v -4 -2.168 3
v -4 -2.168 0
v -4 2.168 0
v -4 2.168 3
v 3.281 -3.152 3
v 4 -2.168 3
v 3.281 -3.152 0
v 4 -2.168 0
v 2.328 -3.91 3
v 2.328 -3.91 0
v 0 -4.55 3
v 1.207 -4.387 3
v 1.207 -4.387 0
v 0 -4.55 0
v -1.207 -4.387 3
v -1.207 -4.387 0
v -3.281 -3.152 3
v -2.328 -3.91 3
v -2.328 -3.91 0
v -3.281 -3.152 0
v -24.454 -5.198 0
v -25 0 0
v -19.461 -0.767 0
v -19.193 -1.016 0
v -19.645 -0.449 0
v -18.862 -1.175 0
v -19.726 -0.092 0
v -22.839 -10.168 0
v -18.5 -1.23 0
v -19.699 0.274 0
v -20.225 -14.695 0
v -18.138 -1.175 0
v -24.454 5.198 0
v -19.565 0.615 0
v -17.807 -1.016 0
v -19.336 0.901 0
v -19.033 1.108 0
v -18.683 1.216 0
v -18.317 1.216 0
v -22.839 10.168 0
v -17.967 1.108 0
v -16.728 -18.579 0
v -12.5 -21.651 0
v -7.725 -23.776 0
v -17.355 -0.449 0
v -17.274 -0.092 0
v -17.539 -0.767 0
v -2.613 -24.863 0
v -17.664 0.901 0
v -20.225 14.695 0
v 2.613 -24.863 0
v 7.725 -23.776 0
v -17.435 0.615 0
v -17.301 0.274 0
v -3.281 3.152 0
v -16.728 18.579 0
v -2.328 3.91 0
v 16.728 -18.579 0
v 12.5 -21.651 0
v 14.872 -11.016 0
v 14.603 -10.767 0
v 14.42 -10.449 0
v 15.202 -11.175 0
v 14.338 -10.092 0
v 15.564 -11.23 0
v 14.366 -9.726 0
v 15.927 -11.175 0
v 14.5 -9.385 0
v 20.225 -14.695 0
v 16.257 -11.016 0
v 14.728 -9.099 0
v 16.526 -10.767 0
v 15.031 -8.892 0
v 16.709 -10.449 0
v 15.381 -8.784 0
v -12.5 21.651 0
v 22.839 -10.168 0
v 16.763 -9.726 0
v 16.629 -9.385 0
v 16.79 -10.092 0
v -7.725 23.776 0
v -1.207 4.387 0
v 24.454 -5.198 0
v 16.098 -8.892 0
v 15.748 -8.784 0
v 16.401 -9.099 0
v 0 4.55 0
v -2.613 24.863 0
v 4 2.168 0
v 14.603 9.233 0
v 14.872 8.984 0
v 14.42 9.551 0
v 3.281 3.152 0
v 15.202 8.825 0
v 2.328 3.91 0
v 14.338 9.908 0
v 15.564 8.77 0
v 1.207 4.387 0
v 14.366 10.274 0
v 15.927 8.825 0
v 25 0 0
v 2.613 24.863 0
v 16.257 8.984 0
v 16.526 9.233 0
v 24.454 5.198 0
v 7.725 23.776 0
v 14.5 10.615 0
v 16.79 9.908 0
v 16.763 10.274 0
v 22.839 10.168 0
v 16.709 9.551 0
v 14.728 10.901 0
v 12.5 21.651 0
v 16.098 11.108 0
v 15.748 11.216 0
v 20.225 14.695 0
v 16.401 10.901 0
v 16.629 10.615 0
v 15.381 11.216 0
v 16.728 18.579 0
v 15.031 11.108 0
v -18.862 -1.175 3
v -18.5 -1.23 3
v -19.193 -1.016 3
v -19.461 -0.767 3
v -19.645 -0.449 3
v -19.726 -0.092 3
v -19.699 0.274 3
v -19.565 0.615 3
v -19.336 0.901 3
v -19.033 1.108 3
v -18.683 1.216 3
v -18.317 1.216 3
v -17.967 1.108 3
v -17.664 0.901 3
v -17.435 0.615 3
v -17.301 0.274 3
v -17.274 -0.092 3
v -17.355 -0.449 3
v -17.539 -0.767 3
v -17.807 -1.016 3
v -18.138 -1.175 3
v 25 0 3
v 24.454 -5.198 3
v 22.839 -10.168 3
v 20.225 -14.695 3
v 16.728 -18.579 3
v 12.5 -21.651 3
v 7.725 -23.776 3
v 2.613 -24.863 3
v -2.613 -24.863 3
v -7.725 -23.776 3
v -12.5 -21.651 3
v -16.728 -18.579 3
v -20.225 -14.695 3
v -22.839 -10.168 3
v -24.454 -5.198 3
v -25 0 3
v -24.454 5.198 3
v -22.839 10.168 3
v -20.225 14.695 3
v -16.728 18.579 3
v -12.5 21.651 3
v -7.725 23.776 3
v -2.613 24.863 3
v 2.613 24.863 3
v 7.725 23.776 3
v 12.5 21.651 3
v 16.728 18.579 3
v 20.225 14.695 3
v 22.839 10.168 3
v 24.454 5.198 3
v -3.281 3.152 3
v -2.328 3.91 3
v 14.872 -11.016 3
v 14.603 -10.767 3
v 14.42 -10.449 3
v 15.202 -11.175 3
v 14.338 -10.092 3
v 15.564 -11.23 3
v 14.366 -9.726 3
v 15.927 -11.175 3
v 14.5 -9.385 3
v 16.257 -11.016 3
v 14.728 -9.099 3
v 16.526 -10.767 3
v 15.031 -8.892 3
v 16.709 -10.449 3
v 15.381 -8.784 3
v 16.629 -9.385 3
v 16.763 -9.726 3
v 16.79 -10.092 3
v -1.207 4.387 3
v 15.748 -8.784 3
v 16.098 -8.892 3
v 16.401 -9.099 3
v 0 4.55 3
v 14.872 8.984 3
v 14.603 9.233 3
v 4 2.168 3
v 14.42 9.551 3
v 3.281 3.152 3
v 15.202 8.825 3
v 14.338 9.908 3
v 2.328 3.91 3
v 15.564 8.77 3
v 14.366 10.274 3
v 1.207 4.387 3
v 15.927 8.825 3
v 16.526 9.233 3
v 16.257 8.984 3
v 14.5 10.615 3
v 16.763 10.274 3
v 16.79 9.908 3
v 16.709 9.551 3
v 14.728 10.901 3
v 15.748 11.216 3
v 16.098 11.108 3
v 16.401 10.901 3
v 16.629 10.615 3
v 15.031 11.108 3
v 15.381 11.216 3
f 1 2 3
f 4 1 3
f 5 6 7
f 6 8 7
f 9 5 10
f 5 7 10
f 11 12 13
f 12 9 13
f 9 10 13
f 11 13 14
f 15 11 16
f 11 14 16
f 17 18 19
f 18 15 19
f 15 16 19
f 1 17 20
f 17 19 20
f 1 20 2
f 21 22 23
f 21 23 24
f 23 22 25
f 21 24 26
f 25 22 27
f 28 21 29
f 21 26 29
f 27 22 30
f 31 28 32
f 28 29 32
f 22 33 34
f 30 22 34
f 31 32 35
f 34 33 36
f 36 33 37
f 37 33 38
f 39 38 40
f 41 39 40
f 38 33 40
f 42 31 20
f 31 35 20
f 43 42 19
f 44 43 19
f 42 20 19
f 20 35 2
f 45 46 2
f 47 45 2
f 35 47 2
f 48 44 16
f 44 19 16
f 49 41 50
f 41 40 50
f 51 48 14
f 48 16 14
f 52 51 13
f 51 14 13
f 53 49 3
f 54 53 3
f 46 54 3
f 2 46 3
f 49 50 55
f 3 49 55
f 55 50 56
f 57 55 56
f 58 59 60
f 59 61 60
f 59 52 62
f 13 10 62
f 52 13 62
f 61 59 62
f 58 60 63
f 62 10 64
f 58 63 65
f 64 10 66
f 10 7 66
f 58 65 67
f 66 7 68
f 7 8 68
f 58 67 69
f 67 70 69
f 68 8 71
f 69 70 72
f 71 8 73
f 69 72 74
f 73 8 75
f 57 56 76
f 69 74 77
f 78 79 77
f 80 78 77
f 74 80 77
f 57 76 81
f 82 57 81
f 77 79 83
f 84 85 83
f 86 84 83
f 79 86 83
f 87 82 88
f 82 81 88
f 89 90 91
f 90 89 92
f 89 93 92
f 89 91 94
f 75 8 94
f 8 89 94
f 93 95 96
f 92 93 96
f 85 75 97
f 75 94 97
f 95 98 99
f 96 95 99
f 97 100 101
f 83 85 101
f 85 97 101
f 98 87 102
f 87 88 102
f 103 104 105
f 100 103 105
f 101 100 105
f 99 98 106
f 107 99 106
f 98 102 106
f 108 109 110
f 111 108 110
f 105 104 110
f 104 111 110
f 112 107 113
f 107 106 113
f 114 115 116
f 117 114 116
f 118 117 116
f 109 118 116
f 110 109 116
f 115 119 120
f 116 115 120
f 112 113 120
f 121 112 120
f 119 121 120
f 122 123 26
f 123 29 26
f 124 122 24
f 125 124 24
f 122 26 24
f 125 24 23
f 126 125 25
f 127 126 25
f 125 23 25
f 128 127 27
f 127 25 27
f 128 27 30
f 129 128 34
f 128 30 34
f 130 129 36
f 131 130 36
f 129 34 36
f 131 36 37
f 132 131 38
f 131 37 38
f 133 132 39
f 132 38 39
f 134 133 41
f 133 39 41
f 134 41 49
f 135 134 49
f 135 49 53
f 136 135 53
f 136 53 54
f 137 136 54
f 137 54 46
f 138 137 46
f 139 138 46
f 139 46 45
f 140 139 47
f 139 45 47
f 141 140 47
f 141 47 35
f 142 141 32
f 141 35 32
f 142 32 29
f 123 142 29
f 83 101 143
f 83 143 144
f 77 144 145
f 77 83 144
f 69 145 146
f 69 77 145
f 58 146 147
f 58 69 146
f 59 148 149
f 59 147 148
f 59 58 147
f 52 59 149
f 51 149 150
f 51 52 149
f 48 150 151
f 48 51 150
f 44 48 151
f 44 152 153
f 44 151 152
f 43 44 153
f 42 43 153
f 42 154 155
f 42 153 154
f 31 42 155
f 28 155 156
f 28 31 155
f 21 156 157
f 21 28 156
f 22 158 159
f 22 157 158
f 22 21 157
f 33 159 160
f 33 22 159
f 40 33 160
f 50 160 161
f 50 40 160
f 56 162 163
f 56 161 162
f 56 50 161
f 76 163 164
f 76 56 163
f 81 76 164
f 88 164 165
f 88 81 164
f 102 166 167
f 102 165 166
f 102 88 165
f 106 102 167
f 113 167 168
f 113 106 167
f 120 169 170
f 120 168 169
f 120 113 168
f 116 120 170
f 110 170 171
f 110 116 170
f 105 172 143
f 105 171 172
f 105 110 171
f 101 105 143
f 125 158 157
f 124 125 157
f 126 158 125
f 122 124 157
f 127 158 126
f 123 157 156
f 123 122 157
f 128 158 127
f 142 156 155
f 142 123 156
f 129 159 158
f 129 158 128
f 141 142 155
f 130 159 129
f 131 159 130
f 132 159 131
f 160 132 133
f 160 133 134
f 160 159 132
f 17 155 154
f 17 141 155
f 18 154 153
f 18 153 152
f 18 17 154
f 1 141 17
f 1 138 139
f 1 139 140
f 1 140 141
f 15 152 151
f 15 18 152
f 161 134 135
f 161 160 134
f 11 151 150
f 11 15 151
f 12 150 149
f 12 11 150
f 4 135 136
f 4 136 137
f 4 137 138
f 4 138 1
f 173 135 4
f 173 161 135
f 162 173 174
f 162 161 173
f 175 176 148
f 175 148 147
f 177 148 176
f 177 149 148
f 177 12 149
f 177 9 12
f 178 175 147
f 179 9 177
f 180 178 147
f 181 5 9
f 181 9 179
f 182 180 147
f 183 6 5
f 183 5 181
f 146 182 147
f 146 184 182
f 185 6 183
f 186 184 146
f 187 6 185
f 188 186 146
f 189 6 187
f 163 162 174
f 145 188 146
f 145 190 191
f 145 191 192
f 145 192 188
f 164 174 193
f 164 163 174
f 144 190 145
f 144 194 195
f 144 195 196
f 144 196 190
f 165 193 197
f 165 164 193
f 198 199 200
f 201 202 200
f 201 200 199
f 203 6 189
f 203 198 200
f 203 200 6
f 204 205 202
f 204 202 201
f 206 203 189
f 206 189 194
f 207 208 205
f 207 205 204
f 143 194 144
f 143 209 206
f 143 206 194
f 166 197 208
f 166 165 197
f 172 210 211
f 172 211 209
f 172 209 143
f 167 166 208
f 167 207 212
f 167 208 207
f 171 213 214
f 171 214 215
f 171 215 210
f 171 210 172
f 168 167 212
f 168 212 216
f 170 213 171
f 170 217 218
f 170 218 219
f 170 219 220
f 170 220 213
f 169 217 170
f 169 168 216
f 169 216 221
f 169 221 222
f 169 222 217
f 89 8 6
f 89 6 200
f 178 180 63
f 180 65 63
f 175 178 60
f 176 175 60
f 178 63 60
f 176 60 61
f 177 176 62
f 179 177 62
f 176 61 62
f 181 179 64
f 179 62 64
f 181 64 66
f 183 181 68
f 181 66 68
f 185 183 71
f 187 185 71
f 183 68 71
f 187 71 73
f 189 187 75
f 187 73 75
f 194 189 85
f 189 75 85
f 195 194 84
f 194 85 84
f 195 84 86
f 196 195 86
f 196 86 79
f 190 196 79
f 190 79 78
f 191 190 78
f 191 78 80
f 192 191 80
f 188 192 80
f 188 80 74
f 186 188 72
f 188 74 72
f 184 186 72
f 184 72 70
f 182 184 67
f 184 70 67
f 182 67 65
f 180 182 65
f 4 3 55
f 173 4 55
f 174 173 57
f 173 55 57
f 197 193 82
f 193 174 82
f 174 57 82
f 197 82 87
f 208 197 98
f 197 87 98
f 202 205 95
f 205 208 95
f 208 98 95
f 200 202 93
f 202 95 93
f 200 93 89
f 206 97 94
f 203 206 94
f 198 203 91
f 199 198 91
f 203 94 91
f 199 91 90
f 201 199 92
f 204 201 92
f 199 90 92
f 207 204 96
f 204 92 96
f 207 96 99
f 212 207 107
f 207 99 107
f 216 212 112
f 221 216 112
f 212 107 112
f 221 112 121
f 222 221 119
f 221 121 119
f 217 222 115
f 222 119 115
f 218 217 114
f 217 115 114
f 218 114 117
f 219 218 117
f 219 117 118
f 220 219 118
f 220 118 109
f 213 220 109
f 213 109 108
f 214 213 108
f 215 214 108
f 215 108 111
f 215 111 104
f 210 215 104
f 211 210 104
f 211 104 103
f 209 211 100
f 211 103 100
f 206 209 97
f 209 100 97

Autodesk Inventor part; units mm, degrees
ref_plane "Plan YZ" through (0, 0, 0) normal (1, 0, 0) x (0, 1, 0)
ref_plane "Plan XZ" through (0, 0, 0) normal (0, 1, 0) x (-1, 0, 0)
ref_plane "Plan XY" through (0, 0, 0) normal (0, 0, 1) x (1, 0, 0)
sketch "Esquisse1" plane through (0, 0, 0) normal (0, 0, 1) x (1, 0, 0)
  circle A0 centre (0, 0) radius 25
  arc A1 (4, 2.1685) -> (-4, 2.1685) centre (0, 0) ccw
  line L0 (-4, -2.1685) -> (-4, 2.1685)
  arc A2 (-4, -2.1685) -> (4, -2.1685) centre (0, 0) ccw
  line L1 (4, -2.1685) -> (4, 2.1685)
  line L2 (0, -35) -> (0, 35) construction
  line L3 (-35, 0) -> (35, 0) construction
  point P0 (0, 0)
  dimension "d0" = 50
  dimension "d1" = 8
  dimension "d2" = 4.55
extrude "Extrusion1" add sketch "Esquisse1" along normal blind 3
sketch "Esquisse6" plane through (0, 0, 3) normal (0, 0, 1) x (1, 0, 0)
  line L0 (-35, 0) -> (35, 0) construction
  line L1 (0, -35) -> (0, 35) construction
  circle A0 centre (0, 0) radius 18.5 construction
  point P0 (-18.5, 0)
  point P1 (15.5644, -10)
  point P2 (15.5644, 10)
  dimension "d5" = 37
  dimension "d6" = 20
hole "Perçage1" at (-18.5, 0, 3) at (15.5644, -10, 3) at (15.5644, 10, 3) direction (0, 0, -1) diameter 2.459 end through all thread size "M3x0.5" class "6H" standard "ISO M"
properties part number "Couvercle_haut" material "Plastique PMMA"
